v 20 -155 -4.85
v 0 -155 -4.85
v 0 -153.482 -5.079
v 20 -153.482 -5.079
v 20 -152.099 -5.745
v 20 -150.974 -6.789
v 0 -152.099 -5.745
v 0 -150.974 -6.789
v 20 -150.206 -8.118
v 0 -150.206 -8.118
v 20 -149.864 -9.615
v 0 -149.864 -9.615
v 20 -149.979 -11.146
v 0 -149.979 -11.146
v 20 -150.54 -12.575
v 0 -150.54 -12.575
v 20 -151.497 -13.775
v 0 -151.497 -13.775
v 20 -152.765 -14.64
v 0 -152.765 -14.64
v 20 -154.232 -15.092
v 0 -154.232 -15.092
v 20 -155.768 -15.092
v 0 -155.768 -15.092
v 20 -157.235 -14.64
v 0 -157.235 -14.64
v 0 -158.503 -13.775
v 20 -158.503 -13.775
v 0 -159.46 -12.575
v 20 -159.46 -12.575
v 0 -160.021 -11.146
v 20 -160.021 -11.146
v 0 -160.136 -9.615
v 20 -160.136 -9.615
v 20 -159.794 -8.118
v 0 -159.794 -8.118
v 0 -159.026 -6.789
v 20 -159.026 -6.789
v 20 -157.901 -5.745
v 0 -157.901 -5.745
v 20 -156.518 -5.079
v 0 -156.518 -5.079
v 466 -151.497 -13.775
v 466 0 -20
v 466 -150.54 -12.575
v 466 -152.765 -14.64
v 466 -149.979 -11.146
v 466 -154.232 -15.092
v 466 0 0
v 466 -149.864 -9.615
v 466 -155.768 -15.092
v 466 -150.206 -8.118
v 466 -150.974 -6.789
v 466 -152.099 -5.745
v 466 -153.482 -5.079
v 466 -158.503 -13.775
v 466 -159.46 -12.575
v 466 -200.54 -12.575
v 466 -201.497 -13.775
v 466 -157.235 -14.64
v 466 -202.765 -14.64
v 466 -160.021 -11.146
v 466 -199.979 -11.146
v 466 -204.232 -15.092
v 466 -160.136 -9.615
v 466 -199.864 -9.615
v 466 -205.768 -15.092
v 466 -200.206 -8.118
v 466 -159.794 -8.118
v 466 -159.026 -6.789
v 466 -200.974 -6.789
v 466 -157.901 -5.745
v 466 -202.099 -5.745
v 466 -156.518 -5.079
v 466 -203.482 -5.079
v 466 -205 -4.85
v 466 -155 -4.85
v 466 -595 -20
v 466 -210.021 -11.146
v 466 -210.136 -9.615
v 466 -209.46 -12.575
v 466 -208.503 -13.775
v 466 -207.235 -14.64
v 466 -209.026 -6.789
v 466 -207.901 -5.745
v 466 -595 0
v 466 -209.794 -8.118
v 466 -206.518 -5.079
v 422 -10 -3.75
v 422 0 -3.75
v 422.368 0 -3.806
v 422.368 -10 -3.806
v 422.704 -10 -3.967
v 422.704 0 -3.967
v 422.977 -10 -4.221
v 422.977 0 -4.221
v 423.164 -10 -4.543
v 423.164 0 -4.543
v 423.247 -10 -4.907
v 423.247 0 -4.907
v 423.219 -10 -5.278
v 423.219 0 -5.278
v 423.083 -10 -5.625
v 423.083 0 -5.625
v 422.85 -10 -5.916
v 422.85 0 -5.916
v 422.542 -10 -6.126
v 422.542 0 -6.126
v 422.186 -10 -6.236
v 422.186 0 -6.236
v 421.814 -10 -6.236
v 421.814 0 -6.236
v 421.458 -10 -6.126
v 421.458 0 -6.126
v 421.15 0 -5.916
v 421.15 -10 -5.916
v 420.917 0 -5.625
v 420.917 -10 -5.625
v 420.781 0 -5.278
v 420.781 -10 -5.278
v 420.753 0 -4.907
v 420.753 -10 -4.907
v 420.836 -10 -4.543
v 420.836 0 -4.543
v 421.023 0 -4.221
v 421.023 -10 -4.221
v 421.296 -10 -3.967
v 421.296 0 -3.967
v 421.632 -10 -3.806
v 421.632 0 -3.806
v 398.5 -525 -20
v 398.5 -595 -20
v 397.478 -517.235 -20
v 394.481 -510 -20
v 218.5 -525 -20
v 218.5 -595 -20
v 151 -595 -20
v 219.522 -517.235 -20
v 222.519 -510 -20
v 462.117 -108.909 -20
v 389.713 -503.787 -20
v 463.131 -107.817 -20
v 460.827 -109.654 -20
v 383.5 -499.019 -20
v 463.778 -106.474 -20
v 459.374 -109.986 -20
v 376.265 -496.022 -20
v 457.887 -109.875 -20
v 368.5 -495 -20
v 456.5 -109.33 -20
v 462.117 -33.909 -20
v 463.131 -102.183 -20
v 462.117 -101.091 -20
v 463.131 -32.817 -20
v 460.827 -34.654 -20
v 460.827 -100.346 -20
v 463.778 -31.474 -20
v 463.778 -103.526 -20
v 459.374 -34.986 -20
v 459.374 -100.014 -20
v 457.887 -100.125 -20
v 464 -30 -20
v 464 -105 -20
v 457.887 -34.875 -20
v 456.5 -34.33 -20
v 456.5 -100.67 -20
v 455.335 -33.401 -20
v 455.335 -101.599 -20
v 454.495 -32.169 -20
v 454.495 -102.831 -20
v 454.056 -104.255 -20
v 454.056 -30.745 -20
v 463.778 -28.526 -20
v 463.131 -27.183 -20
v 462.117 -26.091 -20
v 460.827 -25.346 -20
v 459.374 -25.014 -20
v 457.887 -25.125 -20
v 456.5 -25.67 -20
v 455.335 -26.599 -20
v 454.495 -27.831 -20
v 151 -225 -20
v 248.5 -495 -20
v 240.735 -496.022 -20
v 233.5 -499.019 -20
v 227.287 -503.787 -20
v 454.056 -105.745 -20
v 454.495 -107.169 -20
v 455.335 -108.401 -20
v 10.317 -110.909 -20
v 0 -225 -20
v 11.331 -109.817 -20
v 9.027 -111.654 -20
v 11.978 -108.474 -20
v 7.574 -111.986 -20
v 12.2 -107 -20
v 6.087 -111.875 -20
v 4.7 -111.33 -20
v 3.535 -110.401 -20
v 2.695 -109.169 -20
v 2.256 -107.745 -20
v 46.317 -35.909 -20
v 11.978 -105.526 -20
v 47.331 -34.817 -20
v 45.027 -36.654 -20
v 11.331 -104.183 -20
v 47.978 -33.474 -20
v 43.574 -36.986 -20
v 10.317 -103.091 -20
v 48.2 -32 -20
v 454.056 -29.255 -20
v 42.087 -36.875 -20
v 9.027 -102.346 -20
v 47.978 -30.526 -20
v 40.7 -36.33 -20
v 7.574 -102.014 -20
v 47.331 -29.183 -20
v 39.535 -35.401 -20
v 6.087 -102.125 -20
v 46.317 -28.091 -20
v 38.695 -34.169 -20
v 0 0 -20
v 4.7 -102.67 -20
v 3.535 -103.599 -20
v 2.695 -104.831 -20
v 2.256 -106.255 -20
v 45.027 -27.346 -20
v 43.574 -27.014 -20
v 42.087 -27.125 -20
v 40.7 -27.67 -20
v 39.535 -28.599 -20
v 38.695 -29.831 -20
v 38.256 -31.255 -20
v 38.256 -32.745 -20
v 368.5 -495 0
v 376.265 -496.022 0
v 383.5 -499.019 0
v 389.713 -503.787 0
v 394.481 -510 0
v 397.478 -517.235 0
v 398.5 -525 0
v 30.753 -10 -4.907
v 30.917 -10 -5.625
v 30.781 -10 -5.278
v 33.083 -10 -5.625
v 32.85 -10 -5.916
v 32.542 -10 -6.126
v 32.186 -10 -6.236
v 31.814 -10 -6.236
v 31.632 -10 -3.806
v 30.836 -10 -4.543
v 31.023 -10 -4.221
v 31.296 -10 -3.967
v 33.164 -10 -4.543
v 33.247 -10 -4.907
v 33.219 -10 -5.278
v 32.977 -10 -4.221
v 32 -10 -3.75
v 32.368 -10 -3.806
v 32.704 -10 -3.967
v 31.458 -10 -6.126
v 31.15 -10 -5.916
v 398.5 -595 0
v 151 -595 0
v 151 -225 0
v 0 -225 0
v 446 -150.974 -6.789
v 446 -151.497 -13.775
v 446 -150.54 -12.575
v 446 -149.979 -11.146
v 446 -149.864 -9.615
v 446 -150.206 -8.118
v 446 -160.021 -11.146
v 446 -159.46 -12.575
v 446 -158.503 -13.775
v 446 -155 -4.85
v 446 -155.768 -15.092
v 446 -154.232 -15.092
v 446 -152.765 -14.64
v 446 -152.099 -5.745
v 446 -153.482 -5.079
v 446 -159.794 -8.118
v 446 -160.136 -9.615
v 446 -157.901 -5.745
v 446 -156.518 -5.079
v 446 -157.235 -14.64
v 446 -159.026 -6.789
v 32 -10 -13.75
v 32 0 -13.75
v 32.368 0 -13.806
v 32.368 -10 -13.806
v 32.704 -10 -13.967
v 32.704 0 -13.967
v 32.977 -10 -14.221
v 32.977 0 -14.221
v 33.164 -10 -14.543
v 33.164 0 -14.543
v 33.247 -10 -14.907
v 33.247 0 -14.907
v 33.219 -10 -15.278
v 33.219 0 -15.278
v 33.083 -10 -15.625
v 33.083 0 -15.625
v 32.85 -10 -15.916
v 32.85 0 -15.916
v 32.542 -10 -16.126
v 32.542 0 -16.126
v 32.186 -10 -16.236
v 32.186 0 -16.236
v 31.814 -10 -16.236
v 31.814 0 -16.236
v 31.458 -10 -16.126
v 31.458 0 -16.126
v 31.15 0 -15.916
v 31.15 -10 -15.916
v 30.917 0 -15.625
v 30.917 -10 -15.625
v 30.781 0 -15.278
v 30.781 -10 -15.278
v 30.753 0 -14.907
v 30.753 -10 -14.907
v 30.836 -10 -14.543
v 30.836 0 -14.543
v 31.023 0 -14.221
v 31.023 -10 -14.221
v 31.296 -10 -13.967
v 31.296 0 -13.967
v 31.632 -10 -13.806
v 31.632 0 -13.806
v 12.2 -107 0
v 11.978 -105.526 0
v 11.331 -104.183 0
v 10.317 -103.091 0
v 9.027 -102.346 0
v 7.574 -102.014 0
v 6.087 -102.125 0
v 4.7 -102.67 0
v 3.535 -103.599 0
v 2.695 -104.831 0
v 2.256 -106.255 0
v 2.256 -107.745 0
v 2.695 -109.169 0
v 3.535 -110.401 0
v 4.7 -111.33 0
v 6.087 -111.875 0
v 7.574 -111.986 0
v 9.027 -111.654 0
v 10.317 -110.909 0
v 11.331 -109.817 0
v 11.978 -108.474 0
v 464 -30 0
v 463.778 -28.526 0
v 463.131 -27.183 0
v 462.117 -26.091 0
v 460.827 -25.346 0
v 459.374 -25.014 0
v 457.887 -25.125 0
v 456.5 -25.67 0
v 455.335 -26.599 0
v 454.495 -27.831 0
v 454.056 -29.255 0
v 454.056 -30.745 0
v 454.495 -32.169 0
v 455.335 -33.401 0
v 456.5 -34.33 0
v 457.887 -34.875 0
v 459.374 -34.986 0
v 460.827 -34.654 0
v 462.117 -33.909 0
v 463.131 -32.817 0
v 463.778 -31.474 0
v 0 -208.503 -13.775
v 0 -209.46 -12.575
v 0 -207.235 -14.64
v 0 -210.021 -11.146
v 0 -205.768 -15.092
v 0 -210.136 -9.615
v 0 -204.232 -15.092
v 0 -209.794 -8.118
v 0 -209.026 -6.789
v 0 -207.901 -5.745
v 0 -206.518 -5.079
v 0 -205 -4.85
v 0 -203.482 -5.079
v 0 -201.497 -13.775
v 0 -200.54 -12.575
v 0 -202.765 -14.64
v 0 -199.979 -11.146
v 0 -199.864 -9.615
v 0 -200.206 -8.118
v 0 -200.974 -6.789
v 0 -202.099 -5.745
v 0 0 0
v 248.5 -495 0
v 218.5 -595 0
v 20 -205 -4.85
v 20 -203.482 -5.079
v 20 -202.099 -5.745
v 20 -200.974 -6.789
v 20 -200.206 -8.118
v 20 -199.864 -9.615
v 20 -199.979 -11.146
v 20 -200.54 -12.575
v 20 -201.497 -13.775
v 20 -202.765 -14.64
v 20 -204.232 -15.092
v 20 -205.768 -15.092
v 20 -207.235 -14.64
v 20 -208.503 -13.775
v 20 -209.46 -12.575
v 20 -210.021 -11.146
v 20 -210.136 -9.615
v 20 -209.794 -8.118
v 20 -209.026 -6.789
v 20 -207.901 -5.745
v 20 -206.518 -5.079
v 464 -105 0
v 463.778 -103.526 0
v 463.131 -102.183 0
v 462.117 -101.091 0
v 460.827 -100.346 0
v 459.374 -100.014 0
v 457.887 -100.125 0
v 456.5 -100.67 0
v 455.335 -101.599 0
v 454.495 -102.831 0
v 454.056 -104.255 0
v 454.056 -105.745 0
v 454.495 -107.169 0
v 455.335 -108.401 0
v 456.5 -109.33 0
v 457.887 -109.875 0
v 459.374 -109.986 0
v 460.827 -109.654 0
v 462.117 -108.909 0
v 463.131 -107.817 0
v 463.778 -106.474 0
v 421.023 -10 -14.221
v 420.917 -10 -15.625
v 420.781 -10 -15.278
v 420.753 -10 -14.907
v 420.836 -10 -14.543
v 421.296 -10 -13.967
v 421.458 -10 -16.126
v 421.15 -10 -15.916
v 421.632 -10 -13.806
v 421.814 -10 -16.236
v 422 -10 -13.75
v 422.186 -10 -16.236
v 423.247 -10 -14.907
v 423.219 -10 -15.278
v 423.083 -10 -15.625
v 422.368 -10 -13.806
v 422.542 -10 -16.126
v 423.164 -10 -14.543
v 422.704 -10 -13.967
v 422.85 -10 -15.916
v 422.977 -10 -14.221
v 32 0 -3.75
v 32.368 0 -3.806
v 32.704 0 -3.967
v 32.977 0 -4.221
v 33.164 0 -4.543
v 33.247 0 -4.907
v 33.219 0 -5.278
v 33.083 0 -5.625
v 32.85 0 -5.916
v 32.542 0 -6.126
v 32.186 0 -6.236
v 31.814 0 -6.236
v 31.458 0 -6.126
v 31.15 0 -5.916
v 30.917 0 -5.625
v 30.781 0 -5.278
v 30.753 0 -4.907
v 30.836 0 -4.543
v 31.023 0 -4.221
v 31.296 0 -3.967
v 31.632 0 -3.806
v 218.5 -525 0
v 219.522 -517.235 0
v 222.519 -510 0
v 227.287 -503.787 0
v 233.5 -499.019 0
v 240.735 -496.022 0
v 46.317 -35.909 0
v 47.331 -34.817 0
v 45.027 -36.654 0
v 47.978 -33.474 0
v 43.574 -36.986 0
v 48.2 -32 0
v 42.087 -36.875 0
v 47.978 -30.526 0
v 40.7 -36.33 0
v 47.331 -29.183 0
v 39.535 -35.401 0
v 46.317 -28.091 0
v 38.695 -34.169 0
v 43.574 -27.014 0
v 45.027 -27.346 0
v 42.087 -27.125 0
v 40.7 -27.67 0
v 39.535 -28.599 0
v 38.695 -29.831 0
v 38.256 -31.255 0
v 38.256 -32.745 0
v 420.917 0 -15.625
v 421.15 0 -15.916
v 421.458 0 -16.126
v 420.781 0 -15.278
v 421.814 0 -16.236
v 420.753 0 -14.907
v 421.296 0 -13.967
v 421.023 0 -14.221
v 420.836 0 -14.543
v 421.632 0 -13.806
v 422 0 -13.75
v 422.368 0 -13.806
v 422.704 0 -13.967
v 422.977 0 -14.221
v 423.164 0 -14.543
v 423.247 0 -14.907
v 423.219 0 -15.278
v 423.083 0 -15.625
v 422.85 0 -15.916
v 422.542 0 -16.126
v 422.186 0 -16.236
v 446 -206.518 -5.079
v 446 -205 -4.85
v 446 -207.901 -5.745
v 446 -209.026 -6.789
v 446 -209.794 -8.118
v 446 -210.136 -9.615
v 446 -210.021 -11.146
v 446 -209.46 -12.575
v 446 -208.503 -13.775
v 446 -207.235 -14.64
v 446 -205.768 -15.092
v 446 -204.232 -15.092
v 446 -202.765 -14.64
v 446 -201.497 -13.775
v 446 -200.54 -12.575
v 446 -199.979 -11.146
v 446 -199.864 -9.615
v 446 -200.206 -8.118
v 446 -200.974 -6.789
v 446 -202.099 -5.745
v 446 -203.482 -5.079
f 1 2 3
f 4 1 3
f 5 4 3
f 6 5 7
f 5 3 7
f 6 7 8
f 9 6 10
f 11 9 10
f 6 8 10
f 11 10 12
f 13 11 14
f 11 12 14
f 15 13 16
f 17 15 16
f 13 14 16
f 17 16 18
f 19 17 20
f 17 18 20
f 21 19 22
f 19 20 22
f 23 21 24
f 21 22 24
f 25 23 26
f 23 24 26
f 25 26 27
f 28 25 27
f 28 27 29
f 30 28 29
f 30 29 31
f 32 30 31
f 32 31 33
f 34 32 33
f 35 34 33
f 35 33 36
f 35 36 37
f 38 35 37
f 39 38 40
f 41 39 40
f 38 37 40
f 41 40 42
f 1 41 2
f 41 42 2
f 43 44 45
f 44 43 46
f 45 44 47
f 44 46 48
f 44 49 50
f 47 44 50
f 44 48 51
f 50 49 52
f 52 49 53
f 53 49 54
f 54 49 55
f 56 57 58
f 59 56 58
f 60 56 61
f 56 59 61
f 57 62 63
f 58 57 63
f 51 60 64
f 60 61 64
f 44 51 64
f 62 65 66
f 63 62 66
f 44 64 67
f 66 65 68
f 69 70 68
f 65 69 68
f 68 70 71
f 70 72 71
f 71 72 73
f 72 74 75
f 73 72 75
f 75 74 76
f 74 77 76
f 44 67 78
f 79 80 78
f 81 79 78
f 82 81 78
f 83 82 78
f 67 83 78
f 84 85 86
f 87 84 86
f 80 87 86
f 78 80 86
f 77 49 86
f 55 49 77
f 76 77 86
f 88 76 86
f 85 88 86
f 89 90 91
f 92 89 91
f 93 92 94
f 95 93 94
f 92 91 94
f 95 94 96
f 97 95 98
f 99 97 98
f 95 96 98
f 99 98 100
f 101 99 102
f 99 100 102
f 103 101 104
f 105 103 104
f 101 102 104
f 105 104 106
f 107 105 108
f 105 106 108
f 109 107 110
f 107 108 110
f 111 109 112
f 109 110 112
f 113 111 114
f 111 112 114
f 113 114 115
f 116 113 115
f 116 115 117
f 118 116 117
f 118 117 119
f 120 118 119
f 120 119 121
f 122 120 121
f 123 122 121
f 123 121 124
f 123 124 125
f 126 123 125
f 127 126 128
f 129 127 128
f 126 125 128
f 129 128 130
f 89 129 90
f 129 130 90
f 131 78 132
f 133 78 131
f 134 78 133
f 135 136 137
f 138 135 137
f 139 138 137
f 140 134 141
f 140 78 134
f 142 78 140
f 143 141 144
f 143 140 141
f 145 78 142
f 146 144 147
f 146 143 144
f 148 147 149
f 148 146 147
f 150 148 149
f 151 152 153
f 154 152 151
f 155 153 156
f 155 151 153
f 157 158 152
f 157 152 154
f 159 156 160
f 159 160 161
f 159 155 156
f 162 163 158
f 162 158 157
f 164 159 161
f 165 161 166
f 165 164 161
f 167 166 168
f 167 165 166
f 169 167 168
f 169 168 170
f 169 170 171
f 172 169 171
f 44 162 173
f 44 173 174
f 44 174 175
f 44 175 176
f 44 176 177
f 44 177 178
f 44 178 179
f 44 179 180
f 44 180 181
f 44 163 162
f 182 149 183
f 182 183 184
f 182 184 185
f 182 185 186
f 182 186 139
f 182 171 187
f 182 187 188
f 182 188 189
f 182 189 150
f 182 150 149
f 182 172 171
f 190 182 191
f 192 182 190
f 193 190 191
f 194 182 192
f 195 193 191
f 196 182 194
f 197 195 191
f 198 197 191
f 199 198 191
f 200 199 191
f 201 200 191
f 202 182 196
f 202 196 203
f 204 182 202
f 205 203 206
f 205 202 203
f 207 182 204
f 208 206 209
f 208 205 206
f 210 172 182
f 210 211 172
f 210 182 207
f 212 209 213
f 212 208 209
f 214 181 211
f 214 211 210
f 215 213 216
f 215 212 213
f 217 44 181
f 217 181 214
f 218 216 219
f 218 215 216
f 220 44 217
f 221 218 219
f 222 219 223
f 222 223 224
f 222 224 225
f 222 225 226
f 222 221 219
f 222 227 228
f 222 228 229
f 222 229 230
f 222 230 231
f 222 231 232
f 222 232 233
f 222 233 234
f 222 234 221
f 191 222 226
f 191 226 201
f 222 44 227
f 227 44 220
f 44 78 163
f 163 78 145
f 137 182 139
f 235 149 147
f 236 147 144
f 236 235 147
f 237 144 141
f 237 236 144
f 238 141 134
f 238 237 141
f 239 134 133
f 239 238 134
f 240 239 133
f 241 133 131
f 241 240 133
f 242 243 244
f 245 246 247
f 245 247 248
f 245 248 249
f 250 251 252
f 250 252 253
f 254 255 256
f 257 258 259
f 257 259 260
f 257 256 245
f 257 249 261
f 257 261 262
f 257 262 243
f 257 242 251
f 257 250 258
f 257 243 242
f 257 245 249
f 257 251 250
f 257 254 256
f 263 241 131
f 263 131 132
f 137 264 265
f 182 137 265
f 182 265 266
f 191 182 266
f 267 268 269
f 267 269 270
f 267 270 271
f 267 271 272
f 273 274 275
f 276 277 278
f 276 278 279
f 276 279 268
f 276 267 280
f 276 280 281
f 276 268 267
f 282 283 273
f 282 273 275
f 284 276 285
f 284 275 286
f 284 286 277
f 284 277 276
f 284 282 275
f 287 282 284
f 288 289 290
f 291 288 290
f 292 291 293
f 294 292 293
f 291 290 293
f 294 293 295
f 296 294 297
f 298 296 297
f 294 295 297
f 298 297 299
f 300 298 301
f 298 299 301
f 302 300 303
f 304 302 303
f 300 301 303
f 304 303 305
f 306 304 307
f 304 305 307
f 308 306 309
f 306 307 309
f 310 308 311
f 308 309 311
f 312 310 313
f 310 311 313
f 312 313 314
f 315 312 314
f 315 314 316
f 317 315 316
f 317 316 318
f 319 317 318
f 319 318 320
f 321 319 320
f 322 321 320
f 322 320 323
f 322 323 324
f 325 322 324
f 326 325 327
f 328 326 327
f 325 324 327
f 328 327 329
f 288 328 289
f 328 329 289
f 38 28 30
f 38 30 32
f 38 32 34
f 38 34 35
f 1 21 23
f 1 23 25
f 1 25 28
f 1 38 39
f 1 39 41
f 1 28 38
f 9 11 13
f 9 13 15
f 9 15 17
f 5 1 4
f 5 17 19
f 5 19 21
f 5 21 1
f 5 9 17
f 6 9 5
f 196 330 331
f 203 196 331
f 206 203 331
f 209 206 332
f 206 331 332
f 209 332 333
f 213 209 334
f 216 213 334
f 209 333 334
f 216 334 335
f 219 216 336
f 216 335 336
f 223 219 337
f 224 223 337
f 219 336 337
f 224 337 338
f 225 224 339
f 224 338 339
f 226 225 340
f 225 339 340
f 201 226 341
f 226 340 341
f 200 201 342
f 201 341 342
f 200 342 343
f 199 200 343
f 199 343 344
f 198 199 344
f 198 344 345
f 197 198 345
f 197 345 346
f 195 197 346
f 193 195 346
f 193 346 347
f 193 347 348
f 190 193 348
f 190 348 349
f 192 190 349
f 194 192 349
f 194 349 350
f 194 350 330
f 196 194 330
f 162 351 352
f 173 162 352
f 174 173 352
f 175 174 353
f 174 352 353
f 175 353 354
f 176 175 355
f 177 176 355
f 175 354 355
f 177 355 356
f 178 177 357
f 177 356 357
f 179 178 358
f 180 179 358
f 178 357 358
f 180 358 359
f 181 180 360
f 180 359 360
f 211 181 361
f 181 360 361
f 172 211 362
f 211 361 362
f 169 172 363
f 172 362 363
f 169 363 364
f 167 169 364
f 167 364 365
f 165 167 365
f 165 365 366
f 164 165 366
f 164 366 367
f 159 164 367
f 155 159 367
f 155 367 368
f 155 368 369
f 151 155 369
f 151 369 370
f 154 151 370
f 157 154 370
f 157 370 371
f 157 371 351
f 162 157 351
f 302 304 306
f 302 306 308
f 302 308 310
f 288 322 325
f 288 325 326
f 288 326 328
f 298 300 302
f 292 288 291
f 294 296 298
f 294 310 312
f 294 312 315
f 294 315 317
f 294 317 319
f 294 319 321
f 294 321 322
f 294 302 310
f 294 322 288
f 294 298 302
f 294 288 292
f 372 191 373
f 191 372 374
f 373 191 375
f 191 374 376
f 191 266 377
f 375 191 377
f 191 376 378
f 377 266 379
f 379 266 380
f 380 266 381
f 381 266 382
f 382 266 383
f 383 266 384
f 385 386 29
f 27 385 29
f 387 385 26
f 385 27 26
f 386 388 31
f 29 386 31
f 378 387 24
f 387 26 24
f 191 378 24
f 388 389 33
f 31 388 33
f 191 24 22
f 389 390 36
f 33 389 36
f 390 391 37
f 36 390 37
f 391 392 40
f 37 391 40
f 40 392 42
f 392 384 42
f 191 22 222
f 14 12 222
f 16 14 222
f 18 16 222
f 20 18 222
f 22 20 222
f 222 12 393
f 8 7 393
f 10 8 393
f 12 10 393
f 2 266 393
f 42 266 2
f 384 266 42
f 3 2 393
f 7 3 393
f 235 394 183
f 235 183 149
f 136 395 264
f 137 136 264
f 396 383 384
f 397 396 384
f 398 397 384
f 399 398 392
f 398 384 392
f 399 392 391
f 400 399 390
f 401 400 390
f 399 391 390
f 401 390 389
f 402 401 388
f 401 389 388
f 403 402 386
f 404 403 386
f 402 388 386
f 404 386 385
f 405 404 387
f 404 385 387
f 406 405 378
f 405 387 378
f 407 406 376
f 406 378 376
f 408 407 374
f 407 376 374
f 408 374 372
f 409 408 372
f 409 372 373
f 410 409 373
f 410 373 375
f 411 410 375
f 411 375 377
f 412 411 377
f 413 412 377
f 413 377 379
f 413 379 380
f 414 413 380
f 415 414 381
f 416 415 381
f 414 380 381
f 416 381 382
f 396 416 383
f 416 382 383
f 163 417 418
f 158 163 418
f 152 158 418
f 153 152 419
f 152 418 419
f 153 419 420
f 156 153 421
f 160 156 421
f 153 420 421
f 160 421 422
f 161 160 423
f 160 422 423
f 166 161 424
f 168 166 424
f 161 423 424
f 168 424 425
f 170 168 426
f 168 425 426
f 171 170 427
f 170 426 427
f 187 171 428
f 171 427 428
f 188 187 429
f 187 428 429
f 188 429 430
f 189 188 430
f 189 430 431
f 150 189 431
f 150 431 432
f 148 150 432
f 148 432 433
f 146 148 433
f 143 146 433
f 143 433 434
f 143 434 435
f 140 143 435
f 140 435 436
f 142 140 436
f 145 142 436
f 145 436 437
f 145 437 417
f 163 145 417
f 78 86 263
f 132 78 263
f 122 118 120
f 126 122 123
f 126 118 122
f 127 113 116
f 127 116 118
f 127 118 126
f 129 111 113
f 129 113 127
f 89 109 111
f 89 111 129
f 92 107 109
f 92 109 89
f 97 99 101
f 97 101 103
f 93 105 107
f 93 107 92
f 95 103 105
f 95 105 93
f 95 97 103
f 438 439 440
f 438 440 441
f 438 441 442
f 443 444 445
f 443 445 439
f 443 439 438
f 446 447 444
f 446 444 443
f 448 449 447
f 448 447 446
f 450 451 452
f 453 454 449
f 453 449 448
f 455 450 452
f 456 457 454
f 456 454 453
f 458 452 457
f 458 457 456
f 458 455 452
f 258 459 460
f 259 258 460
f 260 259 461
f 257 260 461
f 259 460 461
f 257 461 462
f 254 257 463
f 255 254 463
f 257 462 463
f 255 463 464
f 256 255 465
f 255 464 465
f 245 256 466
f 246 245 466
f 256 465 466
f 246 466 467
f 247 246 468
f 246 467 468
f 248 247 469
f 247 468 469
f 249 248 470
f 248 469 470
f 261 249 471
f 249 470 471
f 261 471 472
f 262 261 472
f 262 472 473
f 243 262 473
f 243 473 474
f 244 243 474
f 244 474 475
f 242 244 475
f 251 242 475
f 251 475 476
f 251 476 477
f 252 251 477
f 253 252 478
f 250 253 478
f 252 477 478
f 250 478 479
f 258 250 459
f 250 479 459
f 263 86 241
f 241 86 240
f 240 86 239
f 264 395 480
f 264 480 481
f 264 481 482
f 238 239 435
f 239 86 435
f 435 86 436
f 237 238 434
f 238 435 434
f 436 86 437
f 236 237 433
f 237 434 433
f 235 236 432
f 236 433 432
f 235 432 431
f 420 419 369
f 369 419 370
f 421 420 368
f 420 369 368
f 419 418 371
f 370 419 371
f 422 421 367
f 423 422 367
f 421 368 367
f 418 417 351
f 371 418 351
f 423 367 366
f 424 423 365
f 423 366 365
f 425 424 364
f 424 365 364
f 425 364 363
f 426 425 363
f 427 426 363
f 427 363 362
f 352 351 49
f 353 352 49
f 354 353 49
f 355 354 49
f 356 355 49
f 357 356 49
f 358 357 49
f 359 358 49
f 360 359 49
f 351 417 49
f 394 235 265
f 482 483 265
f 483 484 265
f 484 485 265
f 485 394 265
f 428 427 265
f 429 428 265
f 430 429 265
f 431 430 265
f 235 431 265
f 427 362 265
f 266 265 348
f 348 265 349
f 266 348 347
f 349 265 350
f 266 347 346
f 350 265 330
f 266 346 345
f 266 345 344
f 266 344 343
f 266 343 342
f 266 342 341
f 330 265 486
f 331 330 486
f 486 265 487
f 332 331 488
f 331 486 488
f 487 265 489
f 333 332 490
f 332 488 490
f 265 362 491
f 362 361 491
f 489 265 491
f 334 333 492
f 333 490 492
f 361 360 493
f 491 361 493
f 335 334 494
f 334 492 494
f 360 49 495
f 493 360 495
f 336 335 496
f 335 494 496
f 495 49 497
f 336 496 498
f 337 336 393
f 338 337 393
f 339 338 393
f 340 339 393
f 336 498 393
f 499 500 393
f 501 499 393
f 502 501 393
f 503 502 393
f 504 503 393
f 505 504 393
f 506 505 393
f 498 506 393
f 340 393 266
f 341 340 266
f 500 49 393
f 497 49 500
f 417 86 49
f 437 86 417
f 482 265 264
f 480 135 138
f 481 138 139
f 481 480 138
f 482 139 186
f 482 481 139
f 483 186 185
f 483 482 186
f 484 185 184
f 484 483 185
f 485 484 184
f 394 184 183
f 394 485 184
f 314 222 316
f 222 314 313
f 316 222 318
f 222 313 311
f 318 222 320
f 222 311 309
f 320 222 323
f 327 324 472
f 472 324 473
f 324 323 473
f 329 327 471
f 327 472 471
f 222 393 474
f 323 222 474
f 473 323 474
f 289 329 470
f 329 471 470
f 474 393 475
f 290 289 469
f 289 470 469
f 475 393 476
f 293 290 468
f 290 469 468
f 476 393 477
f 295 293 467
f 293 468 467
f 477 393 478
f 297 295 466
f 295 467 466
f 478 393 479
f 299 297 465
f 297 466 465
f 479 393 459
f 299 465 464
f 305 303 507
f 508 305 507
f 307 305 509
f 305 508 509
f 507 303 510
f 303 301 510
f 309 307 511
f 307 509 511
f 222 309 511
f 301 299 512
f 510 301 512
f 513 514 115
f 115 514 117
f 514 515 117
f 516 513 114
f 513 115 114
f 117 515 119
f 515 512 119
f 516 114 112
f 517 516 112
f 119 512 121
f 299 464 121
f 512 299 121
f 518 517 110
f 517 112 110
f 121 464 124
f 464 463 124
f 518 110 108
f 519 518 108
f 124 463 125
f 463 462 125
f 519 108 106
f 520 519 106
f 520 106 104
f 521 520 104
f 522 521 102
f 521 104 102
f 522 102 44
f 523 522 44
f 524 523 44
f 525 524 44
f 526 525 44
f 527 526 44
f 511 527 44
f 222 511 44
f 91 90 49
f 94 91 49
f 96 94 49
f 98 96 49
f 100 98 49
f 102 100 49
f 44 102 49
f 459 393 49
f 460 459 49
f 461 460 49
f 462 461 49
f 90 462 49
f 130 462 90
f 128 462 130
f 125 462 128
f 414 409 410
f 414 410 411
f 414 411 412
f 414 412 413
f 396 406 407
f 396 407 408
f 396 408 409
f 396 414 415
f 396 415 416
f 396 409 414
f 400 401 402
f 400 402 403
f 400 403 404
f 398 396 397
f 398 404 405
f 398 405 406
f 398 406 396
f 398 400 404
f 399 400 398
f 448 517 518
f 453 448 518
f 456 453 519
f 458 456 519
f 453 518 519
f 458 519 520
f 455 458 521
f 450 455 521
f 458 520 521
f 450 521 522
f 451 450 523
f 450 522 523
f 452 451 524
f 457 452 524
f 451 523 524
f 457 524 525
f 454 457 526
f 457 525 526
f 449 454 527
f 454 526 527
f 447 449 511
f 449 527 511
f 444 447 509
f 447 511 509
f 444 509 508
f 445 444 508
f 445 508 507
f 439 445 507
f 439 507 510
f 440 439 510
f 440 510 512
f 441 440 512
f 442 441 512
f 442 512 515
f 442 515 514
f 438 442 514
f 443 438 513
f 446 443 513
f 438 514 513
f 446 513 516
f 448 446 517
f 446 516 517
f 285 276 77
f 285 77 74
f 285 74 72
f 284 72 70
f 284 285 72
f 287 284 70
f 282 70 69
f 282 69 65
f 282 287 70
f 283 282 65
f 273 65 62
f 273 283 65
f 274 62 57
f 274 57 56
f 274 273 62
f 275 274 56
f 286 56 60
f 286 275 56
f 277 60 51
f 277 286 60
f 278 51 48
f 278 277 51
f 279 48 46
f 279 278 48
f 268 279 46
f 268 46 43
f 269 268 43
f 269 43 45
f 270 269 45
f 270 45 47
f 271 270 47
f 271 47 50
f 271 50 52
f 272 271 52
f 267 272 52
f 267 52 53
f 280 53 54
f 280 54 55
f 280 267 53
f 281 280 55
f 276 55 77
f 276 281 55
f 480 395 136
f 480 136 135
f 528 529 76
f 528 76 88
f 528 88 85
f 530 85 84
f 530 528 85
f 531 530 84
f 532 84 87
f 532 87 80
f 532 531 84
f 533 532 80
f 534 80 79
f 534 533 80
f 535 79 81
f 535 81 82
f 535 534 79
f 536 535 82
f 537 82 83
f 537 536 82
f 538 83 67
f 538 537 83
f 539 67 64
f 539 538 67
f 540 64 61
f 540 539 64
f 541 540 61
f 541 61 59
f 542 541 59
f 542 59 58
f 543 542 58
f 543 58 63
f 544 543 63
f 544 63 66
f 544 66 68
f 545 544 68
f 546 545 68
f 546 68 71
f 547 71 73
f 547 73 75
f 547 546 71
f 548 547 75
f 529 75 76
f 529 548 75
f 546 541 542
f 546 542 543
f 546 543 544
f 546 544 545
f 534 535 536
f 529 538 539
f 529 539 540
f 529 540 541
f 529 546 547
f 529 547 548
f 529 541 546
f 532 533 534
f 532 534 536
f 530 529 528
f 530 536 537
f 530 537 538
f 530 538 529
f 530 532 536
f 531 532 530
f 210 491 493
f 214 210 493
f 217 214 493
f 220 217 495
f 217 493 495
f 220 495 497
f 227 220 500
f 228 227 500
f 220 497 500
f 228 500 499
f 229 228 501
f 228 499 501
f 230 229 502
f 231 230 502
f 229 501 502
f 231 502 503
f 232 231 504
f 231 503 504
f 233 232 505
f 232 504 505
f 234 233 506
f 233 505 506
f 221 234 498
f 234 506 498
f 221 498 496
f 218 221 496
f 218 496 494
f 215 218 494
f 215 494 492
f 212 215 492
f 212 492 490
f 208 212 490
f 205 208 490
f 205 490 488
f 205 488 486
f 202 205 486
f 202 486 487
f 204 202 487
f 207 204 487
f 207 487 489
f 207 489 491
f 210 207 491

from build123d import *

# Parameters (mm, degrees)
EXTRUDE_1_DEPTH     = 20
SKETCH_2_R          = 5
CUT_EXTRUDE_1_DEPTH = 757.029761319
SKETCH_3_R          = 5.15
CUT_EXTRUDE_2_DEPTH = 20
CUT_EXTRUDE_START   = -20
SKETCH_4_R          = 5.15
CUT_EXTRUDE_3_DEPTH = 20
SKETCH_5_R          = 1.25
CUT_EXTRUDE_4_DEPTH = 10


with BuildPart() as part:
    # 草图1 → 凸台-拉伸1 (new body)
    with BuildSketch(Plane.XY):
        Polygon((0, 0), (466, 0), (466, -595), (151, -595), (151, -225), (0, -225), align=None)
    extrude(amount=-EXTRUDE_1_DEPTH)

    # 草图2 → 切除-拉伸1 (cut, through all)
    with BuildSketch(Plane.XY):
        with Locations((43.2, -32)):
            Circle(SKETCH_2_R)
        with Locations((459, -30)):
            Circle(SKETCH_2_R)
        with Locations((459, -105)):
            Circle(SKETCH_2_R)
        with Locations((7.2, -107)):
            Circle(SKETCH_2_R)
        with BuildLine():
            Line((218.5, -595), (218.5, -525))
            ThreePointArc((218.5, -525), (227.286796564, -503.786796564), (248.5, -495))
            Line((248.5, -495), (368.5, -495))
            ThreePointArc((368.5, -495), (389.713203436, -503.786796564), (398.5, -525))
            Line((398.5, -525), (398.5, -595))
            Line((398.5, -595), (218.5, -595))
        make_face()
    extrude(amount=-CUT_EXTRUDE_1_DEPTH, mode=Mode.SUBTRACT)

    # 草图3 → 切除-拉伸2 (cut)
    with BuildSketch(Plane.ZY):
        with Locations((-10, -155)):
            Circle(SKETCH_3_R)
        with Locations((-10, -205)):
            Circle(SKETCH_3_R)
    extrude(amount=-CUT_EXTRUDE_2_DEPTH, mode=Mode.SUBTRACT)

    # 草图4 → 切除-拉伸3 (cut)
    with BuildSketch(Plane(origin=(466, 0, 0), x_dir=(0, 0, -1), z_dir=(1, 0, 0)).offset(CUT_EXTRUDE_START)):
        with Locations(Location((10, -155, 0), (0, 0, 180))):
            Circle(SKETCH_4_R)
        with Locations(Location((10, -205, 0), (0, 0, 180))):
            Circle(SKETCH_4_R)
    extrude(amount=CUT_EXTRUDE_3_DEPTH, mode=Mode.SUBTRACT)

    # 草图5 → 切除-拉伸4 (cut)
    with BuildSketch(Plane(origin=(0, 0, 0), x_dir=(1, 0, 0), z_dir=(0, 1, 0))):
        with Locations(Location((32, 15, 0), (0, 0, 270))):
            Circle(SKETCH_5_R)
        with Locations(Location((32, 5, 0), (0, 0, 270))):
            Circle(SKETCH_5_R)
        with Locations(Location((422, 15, 0), (0, 0, 270))):
            Circle(SKETCH_5_R)
        with Locations(Location((422, 5, 0), (0, 0, 270))):
            Circle(SKETCH_5_R)
    extrude(amount=-CUT_EXTRUDE_4_DEPTH, mode=Mode.SUBTRACT)


solid = part.part
